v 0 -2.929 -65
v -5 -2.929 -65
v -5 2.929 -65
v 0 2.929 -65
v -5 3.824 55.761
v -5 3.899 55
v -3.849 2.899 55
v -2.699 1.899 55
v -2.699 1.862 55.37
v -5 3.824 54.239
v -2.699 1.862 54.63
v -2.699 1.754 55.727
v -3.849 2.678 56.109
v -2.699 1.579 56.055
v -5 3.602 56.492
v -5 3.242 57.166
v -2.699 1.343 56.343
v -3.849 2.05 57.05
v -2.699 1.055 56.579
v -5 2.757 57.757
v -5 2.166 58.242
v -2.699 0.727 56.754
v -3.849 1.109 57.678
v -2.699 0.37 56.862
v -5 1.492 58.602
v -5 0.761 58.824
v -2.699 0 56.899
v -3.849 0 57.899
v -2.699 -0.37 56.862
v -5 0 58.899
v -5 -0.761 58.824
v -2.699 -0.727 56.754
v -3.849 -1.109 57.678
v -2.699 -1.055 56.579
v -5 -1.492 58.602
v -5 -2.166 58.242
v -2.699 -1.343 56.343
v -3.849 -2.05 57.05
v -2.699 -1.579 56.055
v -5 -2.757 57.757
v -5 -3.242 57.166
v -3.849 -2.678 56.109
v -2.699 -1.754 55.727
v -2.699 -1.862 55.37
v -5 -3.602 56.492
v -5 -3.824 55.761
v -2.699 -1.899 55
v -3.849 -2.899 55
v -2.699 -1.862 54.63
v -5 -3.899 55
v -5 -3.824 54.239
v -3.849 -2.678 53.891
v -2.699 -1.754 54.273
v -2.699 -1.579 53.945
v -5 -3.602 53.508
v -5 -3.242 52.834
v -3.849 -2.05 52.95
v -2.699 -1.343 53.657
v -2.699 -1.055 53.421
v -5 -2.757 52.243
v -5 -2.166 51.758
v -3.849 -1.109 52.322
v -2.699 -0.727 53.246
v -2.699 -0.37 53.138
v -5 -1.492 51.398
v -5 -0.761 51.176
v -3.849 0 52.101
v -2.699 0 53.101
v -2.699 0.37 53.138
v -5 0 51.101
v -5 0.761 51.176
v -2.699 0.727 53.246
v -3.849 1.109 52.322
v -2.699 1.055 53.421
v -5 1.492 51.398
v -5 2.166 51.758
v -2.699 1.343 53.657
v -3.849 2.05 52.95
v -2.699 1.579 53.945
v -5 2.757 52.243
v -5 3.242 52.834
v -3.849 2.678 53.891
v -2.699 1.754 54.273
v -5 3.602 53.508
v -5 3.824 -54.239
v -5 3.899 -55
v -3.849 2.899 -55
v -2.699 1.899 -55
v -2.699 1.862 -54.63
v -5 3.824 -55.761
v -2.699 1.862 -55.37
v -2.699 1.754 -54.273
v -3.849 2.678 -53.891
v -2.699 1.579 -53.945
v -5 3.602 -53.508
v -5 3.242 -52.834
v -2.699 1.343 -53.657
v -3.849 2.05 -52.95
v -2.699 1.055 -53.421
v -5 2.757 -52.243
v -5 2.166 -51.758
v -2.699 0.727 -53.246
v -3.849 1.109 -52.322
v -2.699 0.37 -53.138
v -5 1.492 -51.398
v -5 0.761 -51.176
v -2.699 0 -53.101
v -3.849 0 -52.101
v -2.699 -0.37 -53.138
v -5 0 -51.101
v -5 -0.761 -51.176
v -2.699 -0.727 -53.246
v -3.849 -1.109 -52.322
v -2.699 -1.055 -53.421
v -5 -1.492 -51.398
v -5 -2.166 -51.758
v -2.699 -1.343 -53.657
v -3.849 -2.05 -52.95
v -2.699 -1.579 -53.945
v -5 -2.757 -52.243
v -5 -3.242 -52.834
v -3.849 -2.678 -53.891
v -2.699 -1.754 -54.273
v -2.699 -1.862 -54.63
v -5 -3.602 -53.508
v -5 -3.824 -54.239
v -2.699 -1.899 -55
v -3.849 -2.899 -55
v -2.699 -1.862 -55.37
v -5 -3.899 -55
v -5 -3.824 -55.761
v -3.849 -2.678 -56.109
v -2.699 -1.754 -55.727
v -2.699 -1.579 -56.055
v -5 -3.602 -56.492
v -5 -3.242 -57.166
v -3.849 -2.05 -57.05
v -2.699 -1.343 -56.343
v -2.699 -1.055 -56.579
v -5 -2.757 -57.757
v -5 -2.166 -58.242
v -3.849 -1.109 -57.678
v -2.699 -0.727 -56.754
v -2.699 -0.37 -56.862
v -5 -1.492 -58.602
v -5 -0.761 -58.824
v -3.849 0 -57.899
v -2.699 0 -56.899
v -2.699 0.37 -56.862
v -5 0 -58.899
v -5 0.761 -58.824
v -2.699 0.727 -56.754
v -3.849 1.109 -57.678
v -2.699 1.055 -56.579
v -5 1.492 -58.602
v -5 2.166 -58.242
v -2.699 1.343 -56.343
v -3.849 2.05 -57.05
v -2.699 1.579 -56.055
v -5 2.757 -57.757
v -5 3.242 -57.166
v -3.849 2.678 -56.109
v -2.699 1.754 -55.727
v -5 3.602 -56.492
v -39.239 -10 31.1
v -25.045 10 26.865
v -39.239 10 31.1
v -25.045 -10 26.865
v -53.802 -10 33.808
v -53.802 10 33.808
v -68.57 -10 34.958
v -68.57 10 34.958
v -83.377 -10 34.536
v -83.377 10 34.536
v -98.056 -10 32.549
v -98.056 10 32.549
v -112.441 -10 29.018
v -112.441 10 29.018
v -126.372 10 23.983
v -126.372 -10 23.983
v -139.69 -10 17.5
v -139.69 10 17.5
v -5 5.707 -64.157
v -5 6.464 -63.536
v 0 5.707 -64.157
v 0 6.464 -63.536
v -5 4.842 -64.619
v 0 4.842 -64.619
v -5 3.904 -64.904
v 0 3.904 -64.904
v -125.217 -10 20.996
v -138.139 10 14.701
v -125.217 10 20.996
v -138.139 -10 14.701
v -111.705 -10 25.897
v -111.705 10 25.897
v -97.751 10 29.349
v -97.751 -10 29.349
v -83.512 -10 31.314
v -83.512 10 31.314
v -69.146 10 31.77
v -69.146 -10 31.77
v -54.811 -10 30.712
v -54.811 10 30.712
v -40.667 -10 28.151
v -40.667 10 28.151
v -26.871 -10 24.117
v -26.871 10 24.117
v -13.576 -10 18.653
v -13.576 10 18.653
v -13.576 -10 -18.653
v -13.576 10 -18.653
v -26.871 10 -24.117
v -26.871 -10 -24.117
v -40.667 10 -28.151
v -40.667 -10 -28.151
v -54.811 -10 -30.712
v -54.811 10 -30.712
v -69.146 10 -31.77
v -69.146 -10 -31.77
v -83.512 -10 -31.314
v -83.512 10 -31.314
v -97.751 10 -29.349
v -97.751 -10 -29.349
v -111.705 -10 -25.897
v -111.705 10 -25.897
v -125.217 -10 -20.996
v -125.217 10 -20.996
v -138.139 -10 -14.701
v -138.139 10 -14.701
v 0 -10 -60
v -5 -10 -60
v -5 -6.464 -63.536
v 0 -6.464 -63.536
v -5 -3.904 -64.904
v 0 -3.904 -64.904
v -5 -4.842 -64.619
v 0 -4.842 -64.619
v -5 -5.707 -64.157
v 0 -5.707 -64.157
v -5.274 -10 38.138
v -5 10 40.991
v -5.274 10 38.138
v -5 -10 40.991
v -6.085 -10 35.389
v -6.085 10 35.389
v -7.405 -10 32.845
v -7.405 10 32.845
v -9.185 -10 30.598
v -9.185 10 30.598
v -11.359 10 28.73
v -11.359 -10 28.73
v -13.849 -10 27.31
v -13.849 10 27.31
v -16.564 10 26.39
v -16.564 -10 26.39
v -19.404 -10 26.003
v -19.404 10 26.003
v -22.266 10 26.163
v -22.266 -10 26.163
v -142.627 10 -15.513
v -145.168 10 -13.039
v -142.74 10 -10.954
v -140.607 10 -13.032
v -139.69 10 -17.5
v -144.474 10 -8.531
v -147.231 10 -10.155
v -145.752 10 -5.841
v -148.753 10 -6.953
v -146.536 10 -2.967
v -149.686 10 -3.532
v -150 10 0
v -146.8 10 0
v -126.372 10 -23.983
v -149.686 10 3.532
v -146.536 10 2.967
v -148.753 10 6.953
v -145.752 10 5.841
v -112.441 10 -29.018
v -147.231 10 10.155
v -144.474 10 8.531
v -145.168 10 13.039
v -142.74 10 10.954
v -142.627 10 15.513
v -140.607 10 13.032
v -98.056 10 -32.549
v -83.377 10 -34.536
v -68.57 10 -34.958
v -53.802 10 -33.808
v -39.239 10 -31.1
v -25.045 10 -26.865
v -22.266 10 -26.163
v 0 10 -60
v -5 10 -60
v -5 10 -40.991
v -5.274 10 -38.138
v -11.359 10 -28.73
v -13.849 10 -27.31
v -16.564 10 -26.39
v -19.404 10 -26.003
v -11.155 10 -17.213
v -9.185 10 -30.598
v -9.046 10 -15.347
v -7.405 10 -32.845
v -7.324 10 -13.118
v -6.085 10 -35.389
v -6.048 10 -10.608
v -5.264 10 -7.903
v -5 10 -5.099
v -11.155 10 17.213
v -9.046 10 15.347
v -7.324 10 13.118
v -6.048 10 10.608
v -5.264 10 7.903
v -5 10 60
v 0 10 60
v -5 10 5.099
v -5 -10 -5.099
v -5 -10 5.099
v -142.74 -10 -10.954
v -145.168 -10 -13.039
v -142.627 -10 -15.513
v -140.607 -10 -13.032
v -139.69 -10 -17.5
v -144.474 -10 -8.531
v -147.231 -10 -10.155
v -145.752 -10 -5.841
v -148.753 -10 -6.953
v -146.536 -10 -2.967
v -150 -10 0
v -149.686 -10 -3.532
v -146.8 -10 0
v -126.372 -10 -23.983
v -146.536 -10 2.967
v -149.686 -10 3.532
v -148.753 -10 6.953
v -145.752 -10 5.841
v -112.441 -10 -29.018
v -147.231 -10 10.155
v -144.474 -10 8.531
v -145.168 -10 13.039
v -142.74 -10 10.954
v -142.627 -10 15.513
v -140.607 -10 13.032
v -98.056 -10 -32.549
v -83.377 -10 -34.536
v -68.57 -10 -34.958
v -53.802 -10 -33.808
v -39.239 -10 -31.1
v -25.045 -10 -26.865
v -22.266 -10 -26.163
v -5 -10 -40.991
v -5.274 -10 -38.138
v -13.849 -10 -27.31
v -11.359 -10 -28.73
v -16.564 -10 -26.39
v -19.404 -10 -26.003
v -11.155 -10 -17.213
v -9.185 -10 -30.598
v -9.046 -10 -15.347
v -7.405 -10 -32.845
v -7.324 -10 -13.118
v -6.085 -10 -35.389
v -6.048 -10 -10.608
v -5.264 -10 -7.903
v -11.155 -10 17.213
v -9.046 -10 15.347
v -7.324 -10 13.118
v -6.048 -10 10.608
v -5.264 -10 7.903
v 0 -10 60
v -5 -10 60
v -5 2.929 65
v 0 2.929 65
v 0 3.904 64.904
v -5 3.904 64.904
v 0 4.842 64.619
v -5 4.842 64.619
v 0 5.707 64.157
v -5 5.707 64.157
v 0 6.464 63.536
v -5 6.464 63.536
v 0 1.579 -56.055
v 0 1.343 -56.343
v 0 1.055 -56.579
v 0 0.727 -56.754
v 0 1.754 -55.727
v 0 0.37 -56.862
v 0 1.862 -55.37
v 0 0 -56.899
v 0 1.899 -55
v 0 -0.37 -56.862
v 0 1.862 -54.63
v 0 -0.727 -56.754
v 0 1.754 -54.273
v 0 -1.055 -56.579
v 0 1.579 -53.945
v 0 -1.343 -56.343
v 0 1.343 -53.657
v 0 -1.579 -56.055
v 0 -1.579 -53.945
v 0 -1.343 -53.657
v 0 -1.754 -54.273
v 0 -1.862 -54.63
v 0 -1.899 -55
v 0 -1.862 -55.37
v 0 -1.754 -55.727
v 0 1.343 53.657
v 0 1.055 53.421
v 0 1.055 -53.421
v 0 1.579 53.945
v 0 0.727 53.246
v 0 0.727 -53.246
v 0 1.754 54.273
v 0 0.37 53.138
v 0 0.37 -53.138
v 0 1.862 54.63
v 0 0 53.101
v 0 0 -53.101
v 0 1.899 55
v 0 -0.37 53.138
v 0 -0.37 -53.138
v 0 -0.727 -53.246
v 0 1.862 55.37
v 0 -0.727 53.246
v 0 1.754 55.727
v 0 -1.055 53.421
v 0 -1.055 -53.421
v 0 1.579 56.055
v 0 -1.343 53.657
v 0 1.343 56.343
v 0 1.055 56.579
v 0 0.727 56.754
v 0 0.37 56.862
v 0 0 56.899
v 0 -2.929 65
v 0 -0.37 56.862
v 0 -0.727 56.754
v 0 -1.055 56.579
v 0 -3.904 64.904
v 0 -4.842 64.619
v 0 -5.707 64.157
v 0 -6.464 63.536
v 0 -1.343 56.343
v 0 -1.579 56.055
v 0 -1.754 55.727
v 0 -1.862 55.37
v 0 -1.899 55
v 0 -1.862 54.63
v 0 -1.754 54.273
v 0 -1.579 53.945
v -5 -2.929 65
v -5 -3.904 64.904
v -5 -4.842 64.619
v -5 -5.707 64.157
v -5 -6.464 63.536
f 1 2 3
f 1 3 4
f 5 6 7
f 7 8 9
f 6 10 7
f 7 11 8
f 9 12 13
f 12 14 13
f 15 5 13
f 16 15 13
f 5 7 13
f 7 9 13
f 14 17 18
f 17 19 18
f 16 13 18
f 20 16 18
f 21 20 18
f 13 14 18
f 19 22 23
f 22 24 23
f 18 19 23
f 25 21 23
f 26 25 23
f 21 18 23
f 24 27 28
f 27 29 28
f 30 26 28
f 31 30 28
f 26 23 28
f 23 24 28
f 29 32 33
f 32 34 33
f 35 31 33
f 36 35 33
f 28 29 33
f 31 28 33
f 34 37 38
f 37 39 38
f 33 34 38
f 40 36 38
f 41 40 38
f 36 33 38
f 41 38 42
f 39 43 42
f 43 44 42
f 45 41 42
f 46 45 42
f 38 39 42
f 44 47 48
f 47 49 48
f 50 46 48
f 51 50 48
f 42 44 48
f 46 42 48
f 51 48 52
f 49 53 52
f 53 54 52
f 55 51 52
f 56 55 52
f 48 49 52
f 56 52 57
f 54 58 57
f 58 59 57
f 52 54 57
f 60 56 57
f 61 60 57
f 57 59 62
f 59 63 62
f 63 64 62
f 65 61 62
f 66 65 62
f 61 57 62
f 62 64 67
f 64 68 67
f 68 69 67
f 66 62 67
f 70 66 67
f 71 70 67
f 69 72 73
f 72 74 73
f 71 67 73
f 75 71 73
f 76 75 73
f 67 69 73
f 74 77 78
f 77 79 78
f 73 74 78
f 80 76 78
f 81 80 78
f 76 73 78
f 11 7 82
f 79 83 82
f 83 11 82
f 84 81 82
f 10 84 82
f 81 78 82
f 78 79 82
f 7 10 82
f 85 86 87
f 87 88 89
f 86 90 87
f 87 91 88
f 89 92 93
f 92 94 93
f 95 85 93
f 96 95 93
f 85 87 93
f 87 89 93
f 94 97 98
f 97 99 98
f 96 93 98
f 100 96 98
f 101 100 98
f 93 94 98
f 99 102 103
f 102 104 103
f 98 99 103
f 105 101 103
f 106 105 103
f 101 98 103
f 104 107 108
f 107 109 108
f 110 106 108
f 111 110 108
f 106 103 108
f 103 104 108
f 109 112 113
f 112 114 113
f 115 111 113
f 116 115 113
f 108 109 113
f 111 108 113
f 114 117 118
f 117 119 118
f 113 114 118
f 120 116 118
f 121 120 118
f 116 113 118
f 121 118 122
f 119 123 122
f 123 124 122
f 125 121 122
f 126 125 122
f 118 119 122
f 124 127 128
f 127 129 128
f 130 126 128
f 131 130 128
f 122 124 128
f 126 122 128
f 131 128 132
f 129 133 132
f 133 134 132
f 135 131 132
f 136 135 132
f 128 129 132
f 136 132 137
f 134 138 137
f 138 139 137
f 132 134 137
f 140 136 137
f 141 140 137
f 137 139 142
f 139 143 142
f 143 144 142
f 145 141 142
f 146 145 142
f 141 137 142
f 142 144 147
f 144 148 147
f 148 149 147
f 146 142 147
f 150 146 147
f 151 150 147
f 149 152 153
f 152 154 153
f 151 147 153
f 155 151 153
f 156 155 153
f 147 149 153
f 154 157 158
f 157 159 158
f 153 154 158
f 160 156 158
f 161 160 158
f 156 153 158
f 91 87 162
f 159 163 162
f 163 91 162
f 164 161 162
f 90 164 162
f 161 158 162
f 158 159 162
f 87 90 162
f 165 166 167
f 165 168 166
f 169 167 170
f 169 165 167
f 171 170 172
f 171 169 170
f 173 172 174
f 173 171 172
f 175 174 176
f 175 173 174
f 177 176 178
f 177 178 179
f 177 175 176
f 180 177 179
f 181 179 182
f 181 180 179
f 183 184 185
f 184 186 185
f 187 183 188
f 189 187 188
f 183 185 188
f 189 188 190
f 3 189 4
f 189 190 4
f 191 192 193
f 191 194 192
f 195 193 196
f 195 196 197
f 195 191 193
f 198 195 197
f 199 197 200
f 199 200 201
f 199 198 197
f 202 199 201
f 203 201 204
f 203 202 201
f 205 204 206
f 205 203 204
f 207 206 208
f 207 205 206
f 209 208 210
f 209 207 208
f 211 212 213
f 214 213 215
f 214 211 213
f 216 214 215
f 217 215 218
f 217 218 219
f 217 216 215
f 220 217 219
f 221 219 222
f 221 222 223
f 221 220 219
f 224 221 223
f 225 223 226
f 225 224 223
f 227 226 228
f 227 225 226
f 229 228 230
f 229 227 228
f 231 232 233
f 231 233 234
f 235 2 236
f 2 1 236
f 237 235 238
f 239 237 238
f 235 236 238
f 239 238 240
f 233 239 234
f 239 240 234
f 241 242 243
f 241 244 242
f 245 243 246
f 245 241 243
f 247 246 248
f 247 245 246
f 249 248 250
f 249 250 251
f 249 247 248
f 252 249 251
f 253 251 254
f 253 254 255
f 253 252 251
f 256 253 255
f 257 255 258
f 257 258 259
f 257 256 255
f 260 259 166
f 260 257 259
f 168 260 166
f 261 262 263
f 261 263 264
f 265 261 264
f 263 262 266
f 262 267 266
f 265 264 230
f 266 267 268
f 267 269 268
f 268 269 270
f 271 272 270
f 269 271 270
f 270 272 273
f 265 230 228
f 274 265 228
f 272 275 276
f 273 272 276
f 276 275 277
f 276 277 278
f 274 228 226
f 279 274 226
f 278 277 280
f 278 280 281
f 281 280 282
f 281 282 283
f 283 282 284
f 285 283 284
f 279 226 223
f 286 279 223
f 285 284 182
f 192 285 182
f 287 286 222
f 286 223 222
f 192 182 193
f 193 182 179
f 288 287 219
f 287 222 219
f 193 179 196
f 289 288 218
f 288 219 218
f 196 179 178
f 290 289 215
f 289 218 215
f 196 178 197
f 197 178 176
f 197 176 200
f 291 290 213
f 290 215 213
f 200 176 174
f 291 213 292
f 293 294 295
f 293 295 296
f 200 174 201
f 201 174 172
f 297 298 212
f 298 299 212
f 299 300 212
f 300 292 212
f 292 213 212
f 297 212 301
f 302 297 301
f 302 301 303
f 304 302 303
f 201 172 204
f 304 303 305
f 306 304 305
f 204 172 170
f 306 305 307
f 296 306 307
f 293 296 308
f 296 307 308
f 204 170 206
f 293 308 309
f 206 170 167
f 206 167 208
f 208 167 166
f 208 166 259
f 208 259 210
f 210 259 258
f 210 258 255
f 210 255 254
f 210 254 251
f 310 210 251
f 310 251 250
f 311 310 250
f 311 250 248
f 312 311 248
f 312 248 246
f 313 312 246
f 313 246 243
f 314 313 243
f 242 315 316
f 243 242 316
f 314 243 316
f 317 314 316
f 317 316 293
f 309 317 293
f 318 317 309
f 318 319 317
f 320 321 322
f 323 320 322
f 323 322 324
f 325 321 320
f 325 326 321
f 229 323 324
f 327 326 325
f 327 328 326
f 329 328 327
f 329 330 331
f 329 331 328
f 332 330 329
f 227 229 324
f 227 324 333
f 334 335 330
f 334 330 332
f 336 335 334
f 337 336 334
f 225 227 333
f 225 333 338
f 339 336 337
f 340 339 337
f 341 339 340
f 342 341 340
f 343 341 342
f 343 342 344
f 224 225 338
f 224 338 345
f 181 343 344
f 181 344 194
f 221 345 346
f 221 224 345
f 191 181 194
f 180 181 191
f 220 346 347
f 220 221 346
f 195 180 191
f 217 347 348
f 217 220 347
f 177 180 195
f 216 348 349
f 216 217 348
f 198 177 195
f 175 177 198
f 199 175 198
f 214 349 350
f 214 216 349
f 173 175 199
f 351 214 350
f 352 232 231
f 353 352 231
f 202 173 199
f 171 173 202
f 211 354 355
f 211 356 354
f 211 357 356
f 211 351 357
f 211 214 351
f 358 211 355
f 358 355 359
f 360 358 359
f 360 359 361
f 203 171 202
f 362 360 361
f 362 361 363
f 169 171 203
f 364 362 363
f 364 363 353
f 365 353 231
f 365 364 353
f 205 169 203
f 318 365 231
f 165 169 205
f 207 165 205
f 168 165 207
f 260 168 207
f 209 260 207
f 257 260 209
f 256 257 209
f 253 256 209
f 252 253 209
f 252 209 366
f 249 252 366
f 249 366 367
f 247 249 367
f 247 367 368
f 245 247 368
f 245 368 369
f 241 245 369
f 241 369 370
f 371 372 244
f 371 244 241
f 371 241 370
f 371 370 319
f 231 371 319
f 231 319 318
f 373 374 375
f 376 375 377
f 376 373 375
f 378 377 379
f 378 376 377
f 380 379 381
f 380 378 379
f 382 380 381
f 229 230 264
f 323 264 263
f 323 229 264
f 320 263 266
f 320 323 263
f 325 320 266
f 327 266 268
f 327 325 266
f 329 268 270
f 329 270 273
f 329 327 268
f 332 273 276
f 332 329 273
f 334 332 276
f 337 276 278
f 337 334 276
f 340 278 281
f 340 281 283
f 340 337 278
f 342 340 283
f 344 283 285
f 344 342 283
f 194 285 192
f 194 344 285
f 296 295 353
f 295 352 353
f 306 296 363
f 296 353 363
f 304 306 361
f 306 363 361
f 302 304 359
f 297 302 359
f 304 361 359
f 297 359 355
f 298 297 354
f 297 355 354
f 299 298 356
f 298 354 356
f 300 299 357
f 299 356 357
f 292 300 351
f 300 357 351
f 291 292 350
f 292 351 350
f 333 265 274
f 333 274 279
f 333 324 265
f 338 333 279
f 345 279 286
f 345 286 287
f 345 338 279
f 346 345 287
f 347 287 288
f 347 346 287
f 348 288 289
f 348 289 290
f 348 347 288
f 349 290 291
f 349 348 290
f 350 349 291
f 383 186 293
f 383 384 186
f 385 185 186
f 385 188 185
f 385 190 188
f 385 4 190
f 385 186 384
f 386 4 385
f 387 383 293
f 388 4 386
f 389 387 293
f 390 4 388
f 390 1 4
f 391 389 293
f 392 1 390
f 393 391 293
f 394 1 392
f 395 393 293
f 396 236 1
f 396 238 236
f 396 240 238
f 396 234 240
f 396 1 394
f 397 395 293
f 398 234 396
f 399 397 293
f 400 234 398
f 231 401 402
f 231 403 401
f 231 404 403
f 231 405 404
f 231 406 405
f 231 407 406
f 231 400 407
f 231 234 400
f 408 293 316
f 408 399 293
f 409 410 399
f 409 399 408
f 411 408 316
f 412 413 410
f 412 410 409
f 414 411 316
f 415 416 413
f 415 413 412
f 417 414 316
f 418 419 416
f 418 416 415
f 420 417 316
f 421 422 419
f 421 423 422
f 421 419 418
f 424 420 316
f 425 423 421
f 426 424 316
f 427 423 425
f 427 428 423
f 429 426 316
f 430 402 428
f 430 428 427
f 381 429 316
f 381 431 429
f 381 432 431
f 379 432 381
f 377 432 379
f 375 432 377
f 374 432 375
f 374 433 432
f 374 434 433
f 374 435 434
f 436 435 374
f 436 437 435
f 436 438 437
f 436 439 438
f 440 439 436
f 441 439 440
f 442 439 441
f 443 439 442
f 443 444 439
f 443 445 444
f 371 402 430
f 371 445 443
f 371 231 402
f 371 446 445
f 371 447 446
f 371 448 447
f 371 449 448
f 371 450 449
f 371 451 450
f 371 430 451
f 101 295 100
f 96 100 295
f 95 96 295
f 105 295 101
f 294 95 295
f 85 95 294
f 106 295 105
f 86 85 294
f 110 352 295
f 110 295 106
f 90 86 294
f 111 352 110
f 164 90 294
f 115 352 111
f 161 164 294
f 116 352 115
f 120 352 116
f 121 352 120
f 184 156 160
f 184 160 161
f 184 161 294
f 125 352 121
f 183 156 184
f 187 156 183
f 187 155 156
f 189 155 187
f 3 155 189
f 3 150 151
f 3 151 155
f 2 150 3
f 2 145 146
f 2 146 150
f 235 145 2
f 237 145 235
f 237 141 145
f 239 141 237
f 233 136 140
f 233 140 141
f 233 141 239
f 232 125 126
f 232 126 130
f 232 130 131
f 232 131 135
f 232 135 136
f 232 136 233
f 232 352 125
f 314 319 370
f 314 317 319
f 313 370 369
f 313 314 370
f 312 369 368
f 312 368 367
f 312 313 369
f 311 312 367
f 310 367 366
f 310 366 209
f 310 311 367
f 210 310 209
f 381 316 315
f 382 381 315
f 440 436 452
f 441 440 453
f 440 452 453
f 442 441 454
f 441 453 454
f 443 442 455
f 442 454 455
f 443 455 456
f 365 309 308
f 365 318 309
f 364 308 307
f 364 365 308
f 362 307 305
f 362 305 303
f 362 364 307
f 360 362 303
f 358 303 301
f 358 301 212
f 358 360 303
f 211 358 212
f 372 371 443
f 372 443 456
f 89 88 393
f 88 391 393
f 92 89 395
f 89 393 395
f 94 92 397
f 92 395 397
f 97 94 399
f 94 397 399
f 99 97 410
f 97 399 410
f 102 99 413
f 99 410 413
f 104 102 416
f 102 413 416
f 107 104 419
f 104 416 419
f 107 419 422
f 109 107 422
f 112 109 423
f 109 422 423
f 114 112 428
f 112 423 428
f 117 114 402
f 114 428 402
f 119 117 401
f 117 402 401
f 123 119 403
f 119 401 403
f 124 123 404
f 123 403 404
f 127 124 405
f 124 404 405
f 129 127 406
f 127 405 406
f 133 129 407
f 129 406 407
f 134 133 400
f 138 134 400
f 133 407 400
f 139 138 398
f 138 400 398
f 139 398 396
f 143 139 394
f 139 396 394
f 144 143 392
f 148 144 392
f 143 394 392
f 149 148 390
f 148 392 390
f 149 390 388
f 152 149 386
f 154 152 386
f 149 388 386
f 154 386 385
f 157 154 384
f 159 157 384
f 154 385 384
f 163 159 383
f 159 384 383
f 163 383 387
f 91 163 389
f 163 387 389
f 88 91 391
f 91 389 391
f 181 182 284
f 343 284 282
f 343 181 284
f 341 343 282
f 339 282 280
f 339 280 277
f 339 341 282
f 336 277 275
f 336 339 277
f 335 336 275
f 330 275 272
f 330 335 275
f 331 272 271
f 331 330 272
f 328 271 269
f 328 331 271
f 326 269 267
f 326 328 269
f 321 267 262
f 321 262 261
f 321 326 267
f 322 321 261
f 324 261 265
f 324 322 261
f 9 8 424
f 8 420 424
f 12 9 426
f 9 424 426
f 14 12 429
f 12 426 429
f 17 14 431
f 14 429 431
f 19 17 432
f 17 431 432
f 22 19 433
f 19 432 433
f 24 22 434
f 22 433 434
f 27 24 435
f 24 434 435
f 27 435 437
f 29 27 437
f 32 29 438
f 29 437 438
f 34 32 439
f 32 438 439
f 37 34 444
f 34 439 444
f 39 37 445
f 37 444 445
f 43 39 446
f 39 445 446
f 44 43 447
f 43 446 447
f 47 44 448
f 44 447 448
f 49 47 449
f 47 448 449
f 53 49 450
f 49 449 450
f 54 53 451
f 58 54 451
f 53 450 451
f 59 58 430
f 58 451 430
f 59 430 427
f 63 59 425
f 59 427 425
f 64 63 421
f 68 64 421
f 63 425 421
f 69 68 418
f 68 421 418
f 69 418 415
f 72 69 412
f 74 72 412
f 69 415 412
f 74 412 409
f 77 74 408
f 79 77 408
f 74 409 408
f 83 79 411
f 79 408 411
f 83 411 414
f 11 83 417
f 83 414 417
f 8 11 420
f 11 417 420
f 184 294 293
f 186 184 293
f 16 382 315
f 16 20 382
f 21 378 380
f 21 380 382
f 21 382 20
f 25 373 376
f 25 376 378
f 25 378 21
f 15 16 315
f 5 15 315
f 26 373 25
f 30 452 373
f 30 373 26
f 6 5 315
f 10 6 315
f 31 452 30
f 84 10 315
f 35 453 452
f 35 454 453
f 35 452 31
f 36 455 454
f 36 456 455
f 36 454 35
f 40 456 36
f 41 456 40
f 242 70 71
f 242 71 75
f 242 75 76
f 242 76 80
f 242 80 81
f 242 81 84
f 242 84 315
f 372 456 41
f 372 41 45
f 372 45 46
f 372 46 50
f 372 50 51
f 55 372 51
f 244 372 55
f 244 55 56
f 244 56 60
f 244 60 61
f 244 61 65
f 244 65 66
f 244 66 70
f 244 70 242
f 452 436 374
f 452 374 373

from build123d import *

# Parameters (mm, degrees)
F1_DEPTH       = 10
F3_D           = 3.7973
F3_CSINK_D     = 7.7978
F3_CSINK_ANGLE = 82
F4_SIZE        = 5
F5_R           = 5
F6_R           = 15


with BuildPart() as f1:
    # F0 (on Front) → F1 (new body, symmetric)
    with BuildSketch(Plane.XZ):
        with BuildLine():
            Line((0, -15), (0, 15))
            ThreePointArc((0, 15), (-2.4851818051, 16.4611506644), (-5, 17.8706822588))
            Line((-5, 17.8706822588), (-5, 14.2103387279))
            Line((-5, 14.2103387279), (-5, -14.2103387279))
            Line((-5, -14.2103387279), (-5, -17.8706822588))
            ThreePointArc((-5, -17.8706822588), (-2.4851818051, -16.4611506644), (0, -15))
        make_face()
        with BuildLine():
            Line((0, 15), (0, 65))
            Line((0, 65), (-5, 65))
            Line((-5, 65), (-5, 17.8706822588))
            ThreePointArc((-5, 17.8706822588), (-2.4851818051, 16.4611506644), (0, 15))
        make_face()
        with BuildLine():
            Line((0, -65), (0, -15))
            ThreePointArc((0, -15), (-2.4851818051, -16.4611506644), (-5, -17.8706822588))
            Line((-5, -17.8706822588), (-5, -65))
            Line((-5, -65), (0, -65))
        make_face()
        with BuildLine():
            Line((-5, 14.2103387279), (-5, 17.8706822588))
            ThreePointArc((-5, 17.8706822588), (-72.3928986571, 34.9994712149), (-139.6904967398, 17.5))
            ThreePointArc((-139.6904967398, 17.5), (-147.231014529, 10.1554893712), (-150, 0))
            ThreePointArc((-150, 0), (-147.231014529, -10.1554893712), (-139.6904967398, -17.5))
            ThreePointArc((-139.6904967398, -17.5), (-72.3928986571, -34.9994712149), (-5, -17.8706822588))
            Line((-5, -17.8706822588), (-5, -14.2103387279))
            ThreePointArc((-5, -14.2103387279), (-71.5057739854, -31.7990733195), (-138.1393945883, -14.7010569646))
            ThreePointArc((-138.1393945883, -14.7010569646), (-144.4738849633, -8.5312244428), (-146.8, 0))
            ThreePointArc((-146.8, 0), (-144.4738849633, 8.5312244428), (-138.1393945883, 14.7010569646))
            ThreePointArc((-138.1393945883, 14.7010569646), (-71.5057739854, 31.7990733195), (-5, 14.2103387279))
        make_face()
    extrude(amount=F1_DEPTH, both=True)

    # F3 (through all)
    with Locations(Plane(origin=(-5, 0, 0), x_dir=(0, -1, 0), z_dir=(-1, 0, 0))):
        with Locations((0, 55), (0, -55)):
            CounterSinkHole(F3_D / 2, F3_CSINK_D / 2, counter_sink_angle=F3_CSINK_ANGLE)

    # F4
    f4_edges = [f1.edges().sort_by_distance(p)[0] for p in [
        (-2.5, -10, 65),
        (-2.5, 10, 65),
        (-2.5, -10, -65),
        (-2.5, 10, -65),
    ]]
    chamfer(f4_edges, length=F4_SIZE)

    # F5
    f5_edges = [f1.edges().sort_by_distance(p)[0] for p in [
        (-2.5, -5, -65),
        (-2.5, 5, -65),
        (-2.5, -5, 65),
        (-2.5, 5, 65),
    ]]
    fillet(f5_edges, radius=F5_R)

    # F6
    f6_edges = [f1.edges().sort_by_distance(p)[0] for p in [
        (-5, 0, 14.210339),
        (-5, 0, 17.870682),
        (-5, 0, -17.870682),
        (-5, 0, -14.210339),
    ]]
    fillet(f6_edges, radius=F6_R)


solid = f1.part
